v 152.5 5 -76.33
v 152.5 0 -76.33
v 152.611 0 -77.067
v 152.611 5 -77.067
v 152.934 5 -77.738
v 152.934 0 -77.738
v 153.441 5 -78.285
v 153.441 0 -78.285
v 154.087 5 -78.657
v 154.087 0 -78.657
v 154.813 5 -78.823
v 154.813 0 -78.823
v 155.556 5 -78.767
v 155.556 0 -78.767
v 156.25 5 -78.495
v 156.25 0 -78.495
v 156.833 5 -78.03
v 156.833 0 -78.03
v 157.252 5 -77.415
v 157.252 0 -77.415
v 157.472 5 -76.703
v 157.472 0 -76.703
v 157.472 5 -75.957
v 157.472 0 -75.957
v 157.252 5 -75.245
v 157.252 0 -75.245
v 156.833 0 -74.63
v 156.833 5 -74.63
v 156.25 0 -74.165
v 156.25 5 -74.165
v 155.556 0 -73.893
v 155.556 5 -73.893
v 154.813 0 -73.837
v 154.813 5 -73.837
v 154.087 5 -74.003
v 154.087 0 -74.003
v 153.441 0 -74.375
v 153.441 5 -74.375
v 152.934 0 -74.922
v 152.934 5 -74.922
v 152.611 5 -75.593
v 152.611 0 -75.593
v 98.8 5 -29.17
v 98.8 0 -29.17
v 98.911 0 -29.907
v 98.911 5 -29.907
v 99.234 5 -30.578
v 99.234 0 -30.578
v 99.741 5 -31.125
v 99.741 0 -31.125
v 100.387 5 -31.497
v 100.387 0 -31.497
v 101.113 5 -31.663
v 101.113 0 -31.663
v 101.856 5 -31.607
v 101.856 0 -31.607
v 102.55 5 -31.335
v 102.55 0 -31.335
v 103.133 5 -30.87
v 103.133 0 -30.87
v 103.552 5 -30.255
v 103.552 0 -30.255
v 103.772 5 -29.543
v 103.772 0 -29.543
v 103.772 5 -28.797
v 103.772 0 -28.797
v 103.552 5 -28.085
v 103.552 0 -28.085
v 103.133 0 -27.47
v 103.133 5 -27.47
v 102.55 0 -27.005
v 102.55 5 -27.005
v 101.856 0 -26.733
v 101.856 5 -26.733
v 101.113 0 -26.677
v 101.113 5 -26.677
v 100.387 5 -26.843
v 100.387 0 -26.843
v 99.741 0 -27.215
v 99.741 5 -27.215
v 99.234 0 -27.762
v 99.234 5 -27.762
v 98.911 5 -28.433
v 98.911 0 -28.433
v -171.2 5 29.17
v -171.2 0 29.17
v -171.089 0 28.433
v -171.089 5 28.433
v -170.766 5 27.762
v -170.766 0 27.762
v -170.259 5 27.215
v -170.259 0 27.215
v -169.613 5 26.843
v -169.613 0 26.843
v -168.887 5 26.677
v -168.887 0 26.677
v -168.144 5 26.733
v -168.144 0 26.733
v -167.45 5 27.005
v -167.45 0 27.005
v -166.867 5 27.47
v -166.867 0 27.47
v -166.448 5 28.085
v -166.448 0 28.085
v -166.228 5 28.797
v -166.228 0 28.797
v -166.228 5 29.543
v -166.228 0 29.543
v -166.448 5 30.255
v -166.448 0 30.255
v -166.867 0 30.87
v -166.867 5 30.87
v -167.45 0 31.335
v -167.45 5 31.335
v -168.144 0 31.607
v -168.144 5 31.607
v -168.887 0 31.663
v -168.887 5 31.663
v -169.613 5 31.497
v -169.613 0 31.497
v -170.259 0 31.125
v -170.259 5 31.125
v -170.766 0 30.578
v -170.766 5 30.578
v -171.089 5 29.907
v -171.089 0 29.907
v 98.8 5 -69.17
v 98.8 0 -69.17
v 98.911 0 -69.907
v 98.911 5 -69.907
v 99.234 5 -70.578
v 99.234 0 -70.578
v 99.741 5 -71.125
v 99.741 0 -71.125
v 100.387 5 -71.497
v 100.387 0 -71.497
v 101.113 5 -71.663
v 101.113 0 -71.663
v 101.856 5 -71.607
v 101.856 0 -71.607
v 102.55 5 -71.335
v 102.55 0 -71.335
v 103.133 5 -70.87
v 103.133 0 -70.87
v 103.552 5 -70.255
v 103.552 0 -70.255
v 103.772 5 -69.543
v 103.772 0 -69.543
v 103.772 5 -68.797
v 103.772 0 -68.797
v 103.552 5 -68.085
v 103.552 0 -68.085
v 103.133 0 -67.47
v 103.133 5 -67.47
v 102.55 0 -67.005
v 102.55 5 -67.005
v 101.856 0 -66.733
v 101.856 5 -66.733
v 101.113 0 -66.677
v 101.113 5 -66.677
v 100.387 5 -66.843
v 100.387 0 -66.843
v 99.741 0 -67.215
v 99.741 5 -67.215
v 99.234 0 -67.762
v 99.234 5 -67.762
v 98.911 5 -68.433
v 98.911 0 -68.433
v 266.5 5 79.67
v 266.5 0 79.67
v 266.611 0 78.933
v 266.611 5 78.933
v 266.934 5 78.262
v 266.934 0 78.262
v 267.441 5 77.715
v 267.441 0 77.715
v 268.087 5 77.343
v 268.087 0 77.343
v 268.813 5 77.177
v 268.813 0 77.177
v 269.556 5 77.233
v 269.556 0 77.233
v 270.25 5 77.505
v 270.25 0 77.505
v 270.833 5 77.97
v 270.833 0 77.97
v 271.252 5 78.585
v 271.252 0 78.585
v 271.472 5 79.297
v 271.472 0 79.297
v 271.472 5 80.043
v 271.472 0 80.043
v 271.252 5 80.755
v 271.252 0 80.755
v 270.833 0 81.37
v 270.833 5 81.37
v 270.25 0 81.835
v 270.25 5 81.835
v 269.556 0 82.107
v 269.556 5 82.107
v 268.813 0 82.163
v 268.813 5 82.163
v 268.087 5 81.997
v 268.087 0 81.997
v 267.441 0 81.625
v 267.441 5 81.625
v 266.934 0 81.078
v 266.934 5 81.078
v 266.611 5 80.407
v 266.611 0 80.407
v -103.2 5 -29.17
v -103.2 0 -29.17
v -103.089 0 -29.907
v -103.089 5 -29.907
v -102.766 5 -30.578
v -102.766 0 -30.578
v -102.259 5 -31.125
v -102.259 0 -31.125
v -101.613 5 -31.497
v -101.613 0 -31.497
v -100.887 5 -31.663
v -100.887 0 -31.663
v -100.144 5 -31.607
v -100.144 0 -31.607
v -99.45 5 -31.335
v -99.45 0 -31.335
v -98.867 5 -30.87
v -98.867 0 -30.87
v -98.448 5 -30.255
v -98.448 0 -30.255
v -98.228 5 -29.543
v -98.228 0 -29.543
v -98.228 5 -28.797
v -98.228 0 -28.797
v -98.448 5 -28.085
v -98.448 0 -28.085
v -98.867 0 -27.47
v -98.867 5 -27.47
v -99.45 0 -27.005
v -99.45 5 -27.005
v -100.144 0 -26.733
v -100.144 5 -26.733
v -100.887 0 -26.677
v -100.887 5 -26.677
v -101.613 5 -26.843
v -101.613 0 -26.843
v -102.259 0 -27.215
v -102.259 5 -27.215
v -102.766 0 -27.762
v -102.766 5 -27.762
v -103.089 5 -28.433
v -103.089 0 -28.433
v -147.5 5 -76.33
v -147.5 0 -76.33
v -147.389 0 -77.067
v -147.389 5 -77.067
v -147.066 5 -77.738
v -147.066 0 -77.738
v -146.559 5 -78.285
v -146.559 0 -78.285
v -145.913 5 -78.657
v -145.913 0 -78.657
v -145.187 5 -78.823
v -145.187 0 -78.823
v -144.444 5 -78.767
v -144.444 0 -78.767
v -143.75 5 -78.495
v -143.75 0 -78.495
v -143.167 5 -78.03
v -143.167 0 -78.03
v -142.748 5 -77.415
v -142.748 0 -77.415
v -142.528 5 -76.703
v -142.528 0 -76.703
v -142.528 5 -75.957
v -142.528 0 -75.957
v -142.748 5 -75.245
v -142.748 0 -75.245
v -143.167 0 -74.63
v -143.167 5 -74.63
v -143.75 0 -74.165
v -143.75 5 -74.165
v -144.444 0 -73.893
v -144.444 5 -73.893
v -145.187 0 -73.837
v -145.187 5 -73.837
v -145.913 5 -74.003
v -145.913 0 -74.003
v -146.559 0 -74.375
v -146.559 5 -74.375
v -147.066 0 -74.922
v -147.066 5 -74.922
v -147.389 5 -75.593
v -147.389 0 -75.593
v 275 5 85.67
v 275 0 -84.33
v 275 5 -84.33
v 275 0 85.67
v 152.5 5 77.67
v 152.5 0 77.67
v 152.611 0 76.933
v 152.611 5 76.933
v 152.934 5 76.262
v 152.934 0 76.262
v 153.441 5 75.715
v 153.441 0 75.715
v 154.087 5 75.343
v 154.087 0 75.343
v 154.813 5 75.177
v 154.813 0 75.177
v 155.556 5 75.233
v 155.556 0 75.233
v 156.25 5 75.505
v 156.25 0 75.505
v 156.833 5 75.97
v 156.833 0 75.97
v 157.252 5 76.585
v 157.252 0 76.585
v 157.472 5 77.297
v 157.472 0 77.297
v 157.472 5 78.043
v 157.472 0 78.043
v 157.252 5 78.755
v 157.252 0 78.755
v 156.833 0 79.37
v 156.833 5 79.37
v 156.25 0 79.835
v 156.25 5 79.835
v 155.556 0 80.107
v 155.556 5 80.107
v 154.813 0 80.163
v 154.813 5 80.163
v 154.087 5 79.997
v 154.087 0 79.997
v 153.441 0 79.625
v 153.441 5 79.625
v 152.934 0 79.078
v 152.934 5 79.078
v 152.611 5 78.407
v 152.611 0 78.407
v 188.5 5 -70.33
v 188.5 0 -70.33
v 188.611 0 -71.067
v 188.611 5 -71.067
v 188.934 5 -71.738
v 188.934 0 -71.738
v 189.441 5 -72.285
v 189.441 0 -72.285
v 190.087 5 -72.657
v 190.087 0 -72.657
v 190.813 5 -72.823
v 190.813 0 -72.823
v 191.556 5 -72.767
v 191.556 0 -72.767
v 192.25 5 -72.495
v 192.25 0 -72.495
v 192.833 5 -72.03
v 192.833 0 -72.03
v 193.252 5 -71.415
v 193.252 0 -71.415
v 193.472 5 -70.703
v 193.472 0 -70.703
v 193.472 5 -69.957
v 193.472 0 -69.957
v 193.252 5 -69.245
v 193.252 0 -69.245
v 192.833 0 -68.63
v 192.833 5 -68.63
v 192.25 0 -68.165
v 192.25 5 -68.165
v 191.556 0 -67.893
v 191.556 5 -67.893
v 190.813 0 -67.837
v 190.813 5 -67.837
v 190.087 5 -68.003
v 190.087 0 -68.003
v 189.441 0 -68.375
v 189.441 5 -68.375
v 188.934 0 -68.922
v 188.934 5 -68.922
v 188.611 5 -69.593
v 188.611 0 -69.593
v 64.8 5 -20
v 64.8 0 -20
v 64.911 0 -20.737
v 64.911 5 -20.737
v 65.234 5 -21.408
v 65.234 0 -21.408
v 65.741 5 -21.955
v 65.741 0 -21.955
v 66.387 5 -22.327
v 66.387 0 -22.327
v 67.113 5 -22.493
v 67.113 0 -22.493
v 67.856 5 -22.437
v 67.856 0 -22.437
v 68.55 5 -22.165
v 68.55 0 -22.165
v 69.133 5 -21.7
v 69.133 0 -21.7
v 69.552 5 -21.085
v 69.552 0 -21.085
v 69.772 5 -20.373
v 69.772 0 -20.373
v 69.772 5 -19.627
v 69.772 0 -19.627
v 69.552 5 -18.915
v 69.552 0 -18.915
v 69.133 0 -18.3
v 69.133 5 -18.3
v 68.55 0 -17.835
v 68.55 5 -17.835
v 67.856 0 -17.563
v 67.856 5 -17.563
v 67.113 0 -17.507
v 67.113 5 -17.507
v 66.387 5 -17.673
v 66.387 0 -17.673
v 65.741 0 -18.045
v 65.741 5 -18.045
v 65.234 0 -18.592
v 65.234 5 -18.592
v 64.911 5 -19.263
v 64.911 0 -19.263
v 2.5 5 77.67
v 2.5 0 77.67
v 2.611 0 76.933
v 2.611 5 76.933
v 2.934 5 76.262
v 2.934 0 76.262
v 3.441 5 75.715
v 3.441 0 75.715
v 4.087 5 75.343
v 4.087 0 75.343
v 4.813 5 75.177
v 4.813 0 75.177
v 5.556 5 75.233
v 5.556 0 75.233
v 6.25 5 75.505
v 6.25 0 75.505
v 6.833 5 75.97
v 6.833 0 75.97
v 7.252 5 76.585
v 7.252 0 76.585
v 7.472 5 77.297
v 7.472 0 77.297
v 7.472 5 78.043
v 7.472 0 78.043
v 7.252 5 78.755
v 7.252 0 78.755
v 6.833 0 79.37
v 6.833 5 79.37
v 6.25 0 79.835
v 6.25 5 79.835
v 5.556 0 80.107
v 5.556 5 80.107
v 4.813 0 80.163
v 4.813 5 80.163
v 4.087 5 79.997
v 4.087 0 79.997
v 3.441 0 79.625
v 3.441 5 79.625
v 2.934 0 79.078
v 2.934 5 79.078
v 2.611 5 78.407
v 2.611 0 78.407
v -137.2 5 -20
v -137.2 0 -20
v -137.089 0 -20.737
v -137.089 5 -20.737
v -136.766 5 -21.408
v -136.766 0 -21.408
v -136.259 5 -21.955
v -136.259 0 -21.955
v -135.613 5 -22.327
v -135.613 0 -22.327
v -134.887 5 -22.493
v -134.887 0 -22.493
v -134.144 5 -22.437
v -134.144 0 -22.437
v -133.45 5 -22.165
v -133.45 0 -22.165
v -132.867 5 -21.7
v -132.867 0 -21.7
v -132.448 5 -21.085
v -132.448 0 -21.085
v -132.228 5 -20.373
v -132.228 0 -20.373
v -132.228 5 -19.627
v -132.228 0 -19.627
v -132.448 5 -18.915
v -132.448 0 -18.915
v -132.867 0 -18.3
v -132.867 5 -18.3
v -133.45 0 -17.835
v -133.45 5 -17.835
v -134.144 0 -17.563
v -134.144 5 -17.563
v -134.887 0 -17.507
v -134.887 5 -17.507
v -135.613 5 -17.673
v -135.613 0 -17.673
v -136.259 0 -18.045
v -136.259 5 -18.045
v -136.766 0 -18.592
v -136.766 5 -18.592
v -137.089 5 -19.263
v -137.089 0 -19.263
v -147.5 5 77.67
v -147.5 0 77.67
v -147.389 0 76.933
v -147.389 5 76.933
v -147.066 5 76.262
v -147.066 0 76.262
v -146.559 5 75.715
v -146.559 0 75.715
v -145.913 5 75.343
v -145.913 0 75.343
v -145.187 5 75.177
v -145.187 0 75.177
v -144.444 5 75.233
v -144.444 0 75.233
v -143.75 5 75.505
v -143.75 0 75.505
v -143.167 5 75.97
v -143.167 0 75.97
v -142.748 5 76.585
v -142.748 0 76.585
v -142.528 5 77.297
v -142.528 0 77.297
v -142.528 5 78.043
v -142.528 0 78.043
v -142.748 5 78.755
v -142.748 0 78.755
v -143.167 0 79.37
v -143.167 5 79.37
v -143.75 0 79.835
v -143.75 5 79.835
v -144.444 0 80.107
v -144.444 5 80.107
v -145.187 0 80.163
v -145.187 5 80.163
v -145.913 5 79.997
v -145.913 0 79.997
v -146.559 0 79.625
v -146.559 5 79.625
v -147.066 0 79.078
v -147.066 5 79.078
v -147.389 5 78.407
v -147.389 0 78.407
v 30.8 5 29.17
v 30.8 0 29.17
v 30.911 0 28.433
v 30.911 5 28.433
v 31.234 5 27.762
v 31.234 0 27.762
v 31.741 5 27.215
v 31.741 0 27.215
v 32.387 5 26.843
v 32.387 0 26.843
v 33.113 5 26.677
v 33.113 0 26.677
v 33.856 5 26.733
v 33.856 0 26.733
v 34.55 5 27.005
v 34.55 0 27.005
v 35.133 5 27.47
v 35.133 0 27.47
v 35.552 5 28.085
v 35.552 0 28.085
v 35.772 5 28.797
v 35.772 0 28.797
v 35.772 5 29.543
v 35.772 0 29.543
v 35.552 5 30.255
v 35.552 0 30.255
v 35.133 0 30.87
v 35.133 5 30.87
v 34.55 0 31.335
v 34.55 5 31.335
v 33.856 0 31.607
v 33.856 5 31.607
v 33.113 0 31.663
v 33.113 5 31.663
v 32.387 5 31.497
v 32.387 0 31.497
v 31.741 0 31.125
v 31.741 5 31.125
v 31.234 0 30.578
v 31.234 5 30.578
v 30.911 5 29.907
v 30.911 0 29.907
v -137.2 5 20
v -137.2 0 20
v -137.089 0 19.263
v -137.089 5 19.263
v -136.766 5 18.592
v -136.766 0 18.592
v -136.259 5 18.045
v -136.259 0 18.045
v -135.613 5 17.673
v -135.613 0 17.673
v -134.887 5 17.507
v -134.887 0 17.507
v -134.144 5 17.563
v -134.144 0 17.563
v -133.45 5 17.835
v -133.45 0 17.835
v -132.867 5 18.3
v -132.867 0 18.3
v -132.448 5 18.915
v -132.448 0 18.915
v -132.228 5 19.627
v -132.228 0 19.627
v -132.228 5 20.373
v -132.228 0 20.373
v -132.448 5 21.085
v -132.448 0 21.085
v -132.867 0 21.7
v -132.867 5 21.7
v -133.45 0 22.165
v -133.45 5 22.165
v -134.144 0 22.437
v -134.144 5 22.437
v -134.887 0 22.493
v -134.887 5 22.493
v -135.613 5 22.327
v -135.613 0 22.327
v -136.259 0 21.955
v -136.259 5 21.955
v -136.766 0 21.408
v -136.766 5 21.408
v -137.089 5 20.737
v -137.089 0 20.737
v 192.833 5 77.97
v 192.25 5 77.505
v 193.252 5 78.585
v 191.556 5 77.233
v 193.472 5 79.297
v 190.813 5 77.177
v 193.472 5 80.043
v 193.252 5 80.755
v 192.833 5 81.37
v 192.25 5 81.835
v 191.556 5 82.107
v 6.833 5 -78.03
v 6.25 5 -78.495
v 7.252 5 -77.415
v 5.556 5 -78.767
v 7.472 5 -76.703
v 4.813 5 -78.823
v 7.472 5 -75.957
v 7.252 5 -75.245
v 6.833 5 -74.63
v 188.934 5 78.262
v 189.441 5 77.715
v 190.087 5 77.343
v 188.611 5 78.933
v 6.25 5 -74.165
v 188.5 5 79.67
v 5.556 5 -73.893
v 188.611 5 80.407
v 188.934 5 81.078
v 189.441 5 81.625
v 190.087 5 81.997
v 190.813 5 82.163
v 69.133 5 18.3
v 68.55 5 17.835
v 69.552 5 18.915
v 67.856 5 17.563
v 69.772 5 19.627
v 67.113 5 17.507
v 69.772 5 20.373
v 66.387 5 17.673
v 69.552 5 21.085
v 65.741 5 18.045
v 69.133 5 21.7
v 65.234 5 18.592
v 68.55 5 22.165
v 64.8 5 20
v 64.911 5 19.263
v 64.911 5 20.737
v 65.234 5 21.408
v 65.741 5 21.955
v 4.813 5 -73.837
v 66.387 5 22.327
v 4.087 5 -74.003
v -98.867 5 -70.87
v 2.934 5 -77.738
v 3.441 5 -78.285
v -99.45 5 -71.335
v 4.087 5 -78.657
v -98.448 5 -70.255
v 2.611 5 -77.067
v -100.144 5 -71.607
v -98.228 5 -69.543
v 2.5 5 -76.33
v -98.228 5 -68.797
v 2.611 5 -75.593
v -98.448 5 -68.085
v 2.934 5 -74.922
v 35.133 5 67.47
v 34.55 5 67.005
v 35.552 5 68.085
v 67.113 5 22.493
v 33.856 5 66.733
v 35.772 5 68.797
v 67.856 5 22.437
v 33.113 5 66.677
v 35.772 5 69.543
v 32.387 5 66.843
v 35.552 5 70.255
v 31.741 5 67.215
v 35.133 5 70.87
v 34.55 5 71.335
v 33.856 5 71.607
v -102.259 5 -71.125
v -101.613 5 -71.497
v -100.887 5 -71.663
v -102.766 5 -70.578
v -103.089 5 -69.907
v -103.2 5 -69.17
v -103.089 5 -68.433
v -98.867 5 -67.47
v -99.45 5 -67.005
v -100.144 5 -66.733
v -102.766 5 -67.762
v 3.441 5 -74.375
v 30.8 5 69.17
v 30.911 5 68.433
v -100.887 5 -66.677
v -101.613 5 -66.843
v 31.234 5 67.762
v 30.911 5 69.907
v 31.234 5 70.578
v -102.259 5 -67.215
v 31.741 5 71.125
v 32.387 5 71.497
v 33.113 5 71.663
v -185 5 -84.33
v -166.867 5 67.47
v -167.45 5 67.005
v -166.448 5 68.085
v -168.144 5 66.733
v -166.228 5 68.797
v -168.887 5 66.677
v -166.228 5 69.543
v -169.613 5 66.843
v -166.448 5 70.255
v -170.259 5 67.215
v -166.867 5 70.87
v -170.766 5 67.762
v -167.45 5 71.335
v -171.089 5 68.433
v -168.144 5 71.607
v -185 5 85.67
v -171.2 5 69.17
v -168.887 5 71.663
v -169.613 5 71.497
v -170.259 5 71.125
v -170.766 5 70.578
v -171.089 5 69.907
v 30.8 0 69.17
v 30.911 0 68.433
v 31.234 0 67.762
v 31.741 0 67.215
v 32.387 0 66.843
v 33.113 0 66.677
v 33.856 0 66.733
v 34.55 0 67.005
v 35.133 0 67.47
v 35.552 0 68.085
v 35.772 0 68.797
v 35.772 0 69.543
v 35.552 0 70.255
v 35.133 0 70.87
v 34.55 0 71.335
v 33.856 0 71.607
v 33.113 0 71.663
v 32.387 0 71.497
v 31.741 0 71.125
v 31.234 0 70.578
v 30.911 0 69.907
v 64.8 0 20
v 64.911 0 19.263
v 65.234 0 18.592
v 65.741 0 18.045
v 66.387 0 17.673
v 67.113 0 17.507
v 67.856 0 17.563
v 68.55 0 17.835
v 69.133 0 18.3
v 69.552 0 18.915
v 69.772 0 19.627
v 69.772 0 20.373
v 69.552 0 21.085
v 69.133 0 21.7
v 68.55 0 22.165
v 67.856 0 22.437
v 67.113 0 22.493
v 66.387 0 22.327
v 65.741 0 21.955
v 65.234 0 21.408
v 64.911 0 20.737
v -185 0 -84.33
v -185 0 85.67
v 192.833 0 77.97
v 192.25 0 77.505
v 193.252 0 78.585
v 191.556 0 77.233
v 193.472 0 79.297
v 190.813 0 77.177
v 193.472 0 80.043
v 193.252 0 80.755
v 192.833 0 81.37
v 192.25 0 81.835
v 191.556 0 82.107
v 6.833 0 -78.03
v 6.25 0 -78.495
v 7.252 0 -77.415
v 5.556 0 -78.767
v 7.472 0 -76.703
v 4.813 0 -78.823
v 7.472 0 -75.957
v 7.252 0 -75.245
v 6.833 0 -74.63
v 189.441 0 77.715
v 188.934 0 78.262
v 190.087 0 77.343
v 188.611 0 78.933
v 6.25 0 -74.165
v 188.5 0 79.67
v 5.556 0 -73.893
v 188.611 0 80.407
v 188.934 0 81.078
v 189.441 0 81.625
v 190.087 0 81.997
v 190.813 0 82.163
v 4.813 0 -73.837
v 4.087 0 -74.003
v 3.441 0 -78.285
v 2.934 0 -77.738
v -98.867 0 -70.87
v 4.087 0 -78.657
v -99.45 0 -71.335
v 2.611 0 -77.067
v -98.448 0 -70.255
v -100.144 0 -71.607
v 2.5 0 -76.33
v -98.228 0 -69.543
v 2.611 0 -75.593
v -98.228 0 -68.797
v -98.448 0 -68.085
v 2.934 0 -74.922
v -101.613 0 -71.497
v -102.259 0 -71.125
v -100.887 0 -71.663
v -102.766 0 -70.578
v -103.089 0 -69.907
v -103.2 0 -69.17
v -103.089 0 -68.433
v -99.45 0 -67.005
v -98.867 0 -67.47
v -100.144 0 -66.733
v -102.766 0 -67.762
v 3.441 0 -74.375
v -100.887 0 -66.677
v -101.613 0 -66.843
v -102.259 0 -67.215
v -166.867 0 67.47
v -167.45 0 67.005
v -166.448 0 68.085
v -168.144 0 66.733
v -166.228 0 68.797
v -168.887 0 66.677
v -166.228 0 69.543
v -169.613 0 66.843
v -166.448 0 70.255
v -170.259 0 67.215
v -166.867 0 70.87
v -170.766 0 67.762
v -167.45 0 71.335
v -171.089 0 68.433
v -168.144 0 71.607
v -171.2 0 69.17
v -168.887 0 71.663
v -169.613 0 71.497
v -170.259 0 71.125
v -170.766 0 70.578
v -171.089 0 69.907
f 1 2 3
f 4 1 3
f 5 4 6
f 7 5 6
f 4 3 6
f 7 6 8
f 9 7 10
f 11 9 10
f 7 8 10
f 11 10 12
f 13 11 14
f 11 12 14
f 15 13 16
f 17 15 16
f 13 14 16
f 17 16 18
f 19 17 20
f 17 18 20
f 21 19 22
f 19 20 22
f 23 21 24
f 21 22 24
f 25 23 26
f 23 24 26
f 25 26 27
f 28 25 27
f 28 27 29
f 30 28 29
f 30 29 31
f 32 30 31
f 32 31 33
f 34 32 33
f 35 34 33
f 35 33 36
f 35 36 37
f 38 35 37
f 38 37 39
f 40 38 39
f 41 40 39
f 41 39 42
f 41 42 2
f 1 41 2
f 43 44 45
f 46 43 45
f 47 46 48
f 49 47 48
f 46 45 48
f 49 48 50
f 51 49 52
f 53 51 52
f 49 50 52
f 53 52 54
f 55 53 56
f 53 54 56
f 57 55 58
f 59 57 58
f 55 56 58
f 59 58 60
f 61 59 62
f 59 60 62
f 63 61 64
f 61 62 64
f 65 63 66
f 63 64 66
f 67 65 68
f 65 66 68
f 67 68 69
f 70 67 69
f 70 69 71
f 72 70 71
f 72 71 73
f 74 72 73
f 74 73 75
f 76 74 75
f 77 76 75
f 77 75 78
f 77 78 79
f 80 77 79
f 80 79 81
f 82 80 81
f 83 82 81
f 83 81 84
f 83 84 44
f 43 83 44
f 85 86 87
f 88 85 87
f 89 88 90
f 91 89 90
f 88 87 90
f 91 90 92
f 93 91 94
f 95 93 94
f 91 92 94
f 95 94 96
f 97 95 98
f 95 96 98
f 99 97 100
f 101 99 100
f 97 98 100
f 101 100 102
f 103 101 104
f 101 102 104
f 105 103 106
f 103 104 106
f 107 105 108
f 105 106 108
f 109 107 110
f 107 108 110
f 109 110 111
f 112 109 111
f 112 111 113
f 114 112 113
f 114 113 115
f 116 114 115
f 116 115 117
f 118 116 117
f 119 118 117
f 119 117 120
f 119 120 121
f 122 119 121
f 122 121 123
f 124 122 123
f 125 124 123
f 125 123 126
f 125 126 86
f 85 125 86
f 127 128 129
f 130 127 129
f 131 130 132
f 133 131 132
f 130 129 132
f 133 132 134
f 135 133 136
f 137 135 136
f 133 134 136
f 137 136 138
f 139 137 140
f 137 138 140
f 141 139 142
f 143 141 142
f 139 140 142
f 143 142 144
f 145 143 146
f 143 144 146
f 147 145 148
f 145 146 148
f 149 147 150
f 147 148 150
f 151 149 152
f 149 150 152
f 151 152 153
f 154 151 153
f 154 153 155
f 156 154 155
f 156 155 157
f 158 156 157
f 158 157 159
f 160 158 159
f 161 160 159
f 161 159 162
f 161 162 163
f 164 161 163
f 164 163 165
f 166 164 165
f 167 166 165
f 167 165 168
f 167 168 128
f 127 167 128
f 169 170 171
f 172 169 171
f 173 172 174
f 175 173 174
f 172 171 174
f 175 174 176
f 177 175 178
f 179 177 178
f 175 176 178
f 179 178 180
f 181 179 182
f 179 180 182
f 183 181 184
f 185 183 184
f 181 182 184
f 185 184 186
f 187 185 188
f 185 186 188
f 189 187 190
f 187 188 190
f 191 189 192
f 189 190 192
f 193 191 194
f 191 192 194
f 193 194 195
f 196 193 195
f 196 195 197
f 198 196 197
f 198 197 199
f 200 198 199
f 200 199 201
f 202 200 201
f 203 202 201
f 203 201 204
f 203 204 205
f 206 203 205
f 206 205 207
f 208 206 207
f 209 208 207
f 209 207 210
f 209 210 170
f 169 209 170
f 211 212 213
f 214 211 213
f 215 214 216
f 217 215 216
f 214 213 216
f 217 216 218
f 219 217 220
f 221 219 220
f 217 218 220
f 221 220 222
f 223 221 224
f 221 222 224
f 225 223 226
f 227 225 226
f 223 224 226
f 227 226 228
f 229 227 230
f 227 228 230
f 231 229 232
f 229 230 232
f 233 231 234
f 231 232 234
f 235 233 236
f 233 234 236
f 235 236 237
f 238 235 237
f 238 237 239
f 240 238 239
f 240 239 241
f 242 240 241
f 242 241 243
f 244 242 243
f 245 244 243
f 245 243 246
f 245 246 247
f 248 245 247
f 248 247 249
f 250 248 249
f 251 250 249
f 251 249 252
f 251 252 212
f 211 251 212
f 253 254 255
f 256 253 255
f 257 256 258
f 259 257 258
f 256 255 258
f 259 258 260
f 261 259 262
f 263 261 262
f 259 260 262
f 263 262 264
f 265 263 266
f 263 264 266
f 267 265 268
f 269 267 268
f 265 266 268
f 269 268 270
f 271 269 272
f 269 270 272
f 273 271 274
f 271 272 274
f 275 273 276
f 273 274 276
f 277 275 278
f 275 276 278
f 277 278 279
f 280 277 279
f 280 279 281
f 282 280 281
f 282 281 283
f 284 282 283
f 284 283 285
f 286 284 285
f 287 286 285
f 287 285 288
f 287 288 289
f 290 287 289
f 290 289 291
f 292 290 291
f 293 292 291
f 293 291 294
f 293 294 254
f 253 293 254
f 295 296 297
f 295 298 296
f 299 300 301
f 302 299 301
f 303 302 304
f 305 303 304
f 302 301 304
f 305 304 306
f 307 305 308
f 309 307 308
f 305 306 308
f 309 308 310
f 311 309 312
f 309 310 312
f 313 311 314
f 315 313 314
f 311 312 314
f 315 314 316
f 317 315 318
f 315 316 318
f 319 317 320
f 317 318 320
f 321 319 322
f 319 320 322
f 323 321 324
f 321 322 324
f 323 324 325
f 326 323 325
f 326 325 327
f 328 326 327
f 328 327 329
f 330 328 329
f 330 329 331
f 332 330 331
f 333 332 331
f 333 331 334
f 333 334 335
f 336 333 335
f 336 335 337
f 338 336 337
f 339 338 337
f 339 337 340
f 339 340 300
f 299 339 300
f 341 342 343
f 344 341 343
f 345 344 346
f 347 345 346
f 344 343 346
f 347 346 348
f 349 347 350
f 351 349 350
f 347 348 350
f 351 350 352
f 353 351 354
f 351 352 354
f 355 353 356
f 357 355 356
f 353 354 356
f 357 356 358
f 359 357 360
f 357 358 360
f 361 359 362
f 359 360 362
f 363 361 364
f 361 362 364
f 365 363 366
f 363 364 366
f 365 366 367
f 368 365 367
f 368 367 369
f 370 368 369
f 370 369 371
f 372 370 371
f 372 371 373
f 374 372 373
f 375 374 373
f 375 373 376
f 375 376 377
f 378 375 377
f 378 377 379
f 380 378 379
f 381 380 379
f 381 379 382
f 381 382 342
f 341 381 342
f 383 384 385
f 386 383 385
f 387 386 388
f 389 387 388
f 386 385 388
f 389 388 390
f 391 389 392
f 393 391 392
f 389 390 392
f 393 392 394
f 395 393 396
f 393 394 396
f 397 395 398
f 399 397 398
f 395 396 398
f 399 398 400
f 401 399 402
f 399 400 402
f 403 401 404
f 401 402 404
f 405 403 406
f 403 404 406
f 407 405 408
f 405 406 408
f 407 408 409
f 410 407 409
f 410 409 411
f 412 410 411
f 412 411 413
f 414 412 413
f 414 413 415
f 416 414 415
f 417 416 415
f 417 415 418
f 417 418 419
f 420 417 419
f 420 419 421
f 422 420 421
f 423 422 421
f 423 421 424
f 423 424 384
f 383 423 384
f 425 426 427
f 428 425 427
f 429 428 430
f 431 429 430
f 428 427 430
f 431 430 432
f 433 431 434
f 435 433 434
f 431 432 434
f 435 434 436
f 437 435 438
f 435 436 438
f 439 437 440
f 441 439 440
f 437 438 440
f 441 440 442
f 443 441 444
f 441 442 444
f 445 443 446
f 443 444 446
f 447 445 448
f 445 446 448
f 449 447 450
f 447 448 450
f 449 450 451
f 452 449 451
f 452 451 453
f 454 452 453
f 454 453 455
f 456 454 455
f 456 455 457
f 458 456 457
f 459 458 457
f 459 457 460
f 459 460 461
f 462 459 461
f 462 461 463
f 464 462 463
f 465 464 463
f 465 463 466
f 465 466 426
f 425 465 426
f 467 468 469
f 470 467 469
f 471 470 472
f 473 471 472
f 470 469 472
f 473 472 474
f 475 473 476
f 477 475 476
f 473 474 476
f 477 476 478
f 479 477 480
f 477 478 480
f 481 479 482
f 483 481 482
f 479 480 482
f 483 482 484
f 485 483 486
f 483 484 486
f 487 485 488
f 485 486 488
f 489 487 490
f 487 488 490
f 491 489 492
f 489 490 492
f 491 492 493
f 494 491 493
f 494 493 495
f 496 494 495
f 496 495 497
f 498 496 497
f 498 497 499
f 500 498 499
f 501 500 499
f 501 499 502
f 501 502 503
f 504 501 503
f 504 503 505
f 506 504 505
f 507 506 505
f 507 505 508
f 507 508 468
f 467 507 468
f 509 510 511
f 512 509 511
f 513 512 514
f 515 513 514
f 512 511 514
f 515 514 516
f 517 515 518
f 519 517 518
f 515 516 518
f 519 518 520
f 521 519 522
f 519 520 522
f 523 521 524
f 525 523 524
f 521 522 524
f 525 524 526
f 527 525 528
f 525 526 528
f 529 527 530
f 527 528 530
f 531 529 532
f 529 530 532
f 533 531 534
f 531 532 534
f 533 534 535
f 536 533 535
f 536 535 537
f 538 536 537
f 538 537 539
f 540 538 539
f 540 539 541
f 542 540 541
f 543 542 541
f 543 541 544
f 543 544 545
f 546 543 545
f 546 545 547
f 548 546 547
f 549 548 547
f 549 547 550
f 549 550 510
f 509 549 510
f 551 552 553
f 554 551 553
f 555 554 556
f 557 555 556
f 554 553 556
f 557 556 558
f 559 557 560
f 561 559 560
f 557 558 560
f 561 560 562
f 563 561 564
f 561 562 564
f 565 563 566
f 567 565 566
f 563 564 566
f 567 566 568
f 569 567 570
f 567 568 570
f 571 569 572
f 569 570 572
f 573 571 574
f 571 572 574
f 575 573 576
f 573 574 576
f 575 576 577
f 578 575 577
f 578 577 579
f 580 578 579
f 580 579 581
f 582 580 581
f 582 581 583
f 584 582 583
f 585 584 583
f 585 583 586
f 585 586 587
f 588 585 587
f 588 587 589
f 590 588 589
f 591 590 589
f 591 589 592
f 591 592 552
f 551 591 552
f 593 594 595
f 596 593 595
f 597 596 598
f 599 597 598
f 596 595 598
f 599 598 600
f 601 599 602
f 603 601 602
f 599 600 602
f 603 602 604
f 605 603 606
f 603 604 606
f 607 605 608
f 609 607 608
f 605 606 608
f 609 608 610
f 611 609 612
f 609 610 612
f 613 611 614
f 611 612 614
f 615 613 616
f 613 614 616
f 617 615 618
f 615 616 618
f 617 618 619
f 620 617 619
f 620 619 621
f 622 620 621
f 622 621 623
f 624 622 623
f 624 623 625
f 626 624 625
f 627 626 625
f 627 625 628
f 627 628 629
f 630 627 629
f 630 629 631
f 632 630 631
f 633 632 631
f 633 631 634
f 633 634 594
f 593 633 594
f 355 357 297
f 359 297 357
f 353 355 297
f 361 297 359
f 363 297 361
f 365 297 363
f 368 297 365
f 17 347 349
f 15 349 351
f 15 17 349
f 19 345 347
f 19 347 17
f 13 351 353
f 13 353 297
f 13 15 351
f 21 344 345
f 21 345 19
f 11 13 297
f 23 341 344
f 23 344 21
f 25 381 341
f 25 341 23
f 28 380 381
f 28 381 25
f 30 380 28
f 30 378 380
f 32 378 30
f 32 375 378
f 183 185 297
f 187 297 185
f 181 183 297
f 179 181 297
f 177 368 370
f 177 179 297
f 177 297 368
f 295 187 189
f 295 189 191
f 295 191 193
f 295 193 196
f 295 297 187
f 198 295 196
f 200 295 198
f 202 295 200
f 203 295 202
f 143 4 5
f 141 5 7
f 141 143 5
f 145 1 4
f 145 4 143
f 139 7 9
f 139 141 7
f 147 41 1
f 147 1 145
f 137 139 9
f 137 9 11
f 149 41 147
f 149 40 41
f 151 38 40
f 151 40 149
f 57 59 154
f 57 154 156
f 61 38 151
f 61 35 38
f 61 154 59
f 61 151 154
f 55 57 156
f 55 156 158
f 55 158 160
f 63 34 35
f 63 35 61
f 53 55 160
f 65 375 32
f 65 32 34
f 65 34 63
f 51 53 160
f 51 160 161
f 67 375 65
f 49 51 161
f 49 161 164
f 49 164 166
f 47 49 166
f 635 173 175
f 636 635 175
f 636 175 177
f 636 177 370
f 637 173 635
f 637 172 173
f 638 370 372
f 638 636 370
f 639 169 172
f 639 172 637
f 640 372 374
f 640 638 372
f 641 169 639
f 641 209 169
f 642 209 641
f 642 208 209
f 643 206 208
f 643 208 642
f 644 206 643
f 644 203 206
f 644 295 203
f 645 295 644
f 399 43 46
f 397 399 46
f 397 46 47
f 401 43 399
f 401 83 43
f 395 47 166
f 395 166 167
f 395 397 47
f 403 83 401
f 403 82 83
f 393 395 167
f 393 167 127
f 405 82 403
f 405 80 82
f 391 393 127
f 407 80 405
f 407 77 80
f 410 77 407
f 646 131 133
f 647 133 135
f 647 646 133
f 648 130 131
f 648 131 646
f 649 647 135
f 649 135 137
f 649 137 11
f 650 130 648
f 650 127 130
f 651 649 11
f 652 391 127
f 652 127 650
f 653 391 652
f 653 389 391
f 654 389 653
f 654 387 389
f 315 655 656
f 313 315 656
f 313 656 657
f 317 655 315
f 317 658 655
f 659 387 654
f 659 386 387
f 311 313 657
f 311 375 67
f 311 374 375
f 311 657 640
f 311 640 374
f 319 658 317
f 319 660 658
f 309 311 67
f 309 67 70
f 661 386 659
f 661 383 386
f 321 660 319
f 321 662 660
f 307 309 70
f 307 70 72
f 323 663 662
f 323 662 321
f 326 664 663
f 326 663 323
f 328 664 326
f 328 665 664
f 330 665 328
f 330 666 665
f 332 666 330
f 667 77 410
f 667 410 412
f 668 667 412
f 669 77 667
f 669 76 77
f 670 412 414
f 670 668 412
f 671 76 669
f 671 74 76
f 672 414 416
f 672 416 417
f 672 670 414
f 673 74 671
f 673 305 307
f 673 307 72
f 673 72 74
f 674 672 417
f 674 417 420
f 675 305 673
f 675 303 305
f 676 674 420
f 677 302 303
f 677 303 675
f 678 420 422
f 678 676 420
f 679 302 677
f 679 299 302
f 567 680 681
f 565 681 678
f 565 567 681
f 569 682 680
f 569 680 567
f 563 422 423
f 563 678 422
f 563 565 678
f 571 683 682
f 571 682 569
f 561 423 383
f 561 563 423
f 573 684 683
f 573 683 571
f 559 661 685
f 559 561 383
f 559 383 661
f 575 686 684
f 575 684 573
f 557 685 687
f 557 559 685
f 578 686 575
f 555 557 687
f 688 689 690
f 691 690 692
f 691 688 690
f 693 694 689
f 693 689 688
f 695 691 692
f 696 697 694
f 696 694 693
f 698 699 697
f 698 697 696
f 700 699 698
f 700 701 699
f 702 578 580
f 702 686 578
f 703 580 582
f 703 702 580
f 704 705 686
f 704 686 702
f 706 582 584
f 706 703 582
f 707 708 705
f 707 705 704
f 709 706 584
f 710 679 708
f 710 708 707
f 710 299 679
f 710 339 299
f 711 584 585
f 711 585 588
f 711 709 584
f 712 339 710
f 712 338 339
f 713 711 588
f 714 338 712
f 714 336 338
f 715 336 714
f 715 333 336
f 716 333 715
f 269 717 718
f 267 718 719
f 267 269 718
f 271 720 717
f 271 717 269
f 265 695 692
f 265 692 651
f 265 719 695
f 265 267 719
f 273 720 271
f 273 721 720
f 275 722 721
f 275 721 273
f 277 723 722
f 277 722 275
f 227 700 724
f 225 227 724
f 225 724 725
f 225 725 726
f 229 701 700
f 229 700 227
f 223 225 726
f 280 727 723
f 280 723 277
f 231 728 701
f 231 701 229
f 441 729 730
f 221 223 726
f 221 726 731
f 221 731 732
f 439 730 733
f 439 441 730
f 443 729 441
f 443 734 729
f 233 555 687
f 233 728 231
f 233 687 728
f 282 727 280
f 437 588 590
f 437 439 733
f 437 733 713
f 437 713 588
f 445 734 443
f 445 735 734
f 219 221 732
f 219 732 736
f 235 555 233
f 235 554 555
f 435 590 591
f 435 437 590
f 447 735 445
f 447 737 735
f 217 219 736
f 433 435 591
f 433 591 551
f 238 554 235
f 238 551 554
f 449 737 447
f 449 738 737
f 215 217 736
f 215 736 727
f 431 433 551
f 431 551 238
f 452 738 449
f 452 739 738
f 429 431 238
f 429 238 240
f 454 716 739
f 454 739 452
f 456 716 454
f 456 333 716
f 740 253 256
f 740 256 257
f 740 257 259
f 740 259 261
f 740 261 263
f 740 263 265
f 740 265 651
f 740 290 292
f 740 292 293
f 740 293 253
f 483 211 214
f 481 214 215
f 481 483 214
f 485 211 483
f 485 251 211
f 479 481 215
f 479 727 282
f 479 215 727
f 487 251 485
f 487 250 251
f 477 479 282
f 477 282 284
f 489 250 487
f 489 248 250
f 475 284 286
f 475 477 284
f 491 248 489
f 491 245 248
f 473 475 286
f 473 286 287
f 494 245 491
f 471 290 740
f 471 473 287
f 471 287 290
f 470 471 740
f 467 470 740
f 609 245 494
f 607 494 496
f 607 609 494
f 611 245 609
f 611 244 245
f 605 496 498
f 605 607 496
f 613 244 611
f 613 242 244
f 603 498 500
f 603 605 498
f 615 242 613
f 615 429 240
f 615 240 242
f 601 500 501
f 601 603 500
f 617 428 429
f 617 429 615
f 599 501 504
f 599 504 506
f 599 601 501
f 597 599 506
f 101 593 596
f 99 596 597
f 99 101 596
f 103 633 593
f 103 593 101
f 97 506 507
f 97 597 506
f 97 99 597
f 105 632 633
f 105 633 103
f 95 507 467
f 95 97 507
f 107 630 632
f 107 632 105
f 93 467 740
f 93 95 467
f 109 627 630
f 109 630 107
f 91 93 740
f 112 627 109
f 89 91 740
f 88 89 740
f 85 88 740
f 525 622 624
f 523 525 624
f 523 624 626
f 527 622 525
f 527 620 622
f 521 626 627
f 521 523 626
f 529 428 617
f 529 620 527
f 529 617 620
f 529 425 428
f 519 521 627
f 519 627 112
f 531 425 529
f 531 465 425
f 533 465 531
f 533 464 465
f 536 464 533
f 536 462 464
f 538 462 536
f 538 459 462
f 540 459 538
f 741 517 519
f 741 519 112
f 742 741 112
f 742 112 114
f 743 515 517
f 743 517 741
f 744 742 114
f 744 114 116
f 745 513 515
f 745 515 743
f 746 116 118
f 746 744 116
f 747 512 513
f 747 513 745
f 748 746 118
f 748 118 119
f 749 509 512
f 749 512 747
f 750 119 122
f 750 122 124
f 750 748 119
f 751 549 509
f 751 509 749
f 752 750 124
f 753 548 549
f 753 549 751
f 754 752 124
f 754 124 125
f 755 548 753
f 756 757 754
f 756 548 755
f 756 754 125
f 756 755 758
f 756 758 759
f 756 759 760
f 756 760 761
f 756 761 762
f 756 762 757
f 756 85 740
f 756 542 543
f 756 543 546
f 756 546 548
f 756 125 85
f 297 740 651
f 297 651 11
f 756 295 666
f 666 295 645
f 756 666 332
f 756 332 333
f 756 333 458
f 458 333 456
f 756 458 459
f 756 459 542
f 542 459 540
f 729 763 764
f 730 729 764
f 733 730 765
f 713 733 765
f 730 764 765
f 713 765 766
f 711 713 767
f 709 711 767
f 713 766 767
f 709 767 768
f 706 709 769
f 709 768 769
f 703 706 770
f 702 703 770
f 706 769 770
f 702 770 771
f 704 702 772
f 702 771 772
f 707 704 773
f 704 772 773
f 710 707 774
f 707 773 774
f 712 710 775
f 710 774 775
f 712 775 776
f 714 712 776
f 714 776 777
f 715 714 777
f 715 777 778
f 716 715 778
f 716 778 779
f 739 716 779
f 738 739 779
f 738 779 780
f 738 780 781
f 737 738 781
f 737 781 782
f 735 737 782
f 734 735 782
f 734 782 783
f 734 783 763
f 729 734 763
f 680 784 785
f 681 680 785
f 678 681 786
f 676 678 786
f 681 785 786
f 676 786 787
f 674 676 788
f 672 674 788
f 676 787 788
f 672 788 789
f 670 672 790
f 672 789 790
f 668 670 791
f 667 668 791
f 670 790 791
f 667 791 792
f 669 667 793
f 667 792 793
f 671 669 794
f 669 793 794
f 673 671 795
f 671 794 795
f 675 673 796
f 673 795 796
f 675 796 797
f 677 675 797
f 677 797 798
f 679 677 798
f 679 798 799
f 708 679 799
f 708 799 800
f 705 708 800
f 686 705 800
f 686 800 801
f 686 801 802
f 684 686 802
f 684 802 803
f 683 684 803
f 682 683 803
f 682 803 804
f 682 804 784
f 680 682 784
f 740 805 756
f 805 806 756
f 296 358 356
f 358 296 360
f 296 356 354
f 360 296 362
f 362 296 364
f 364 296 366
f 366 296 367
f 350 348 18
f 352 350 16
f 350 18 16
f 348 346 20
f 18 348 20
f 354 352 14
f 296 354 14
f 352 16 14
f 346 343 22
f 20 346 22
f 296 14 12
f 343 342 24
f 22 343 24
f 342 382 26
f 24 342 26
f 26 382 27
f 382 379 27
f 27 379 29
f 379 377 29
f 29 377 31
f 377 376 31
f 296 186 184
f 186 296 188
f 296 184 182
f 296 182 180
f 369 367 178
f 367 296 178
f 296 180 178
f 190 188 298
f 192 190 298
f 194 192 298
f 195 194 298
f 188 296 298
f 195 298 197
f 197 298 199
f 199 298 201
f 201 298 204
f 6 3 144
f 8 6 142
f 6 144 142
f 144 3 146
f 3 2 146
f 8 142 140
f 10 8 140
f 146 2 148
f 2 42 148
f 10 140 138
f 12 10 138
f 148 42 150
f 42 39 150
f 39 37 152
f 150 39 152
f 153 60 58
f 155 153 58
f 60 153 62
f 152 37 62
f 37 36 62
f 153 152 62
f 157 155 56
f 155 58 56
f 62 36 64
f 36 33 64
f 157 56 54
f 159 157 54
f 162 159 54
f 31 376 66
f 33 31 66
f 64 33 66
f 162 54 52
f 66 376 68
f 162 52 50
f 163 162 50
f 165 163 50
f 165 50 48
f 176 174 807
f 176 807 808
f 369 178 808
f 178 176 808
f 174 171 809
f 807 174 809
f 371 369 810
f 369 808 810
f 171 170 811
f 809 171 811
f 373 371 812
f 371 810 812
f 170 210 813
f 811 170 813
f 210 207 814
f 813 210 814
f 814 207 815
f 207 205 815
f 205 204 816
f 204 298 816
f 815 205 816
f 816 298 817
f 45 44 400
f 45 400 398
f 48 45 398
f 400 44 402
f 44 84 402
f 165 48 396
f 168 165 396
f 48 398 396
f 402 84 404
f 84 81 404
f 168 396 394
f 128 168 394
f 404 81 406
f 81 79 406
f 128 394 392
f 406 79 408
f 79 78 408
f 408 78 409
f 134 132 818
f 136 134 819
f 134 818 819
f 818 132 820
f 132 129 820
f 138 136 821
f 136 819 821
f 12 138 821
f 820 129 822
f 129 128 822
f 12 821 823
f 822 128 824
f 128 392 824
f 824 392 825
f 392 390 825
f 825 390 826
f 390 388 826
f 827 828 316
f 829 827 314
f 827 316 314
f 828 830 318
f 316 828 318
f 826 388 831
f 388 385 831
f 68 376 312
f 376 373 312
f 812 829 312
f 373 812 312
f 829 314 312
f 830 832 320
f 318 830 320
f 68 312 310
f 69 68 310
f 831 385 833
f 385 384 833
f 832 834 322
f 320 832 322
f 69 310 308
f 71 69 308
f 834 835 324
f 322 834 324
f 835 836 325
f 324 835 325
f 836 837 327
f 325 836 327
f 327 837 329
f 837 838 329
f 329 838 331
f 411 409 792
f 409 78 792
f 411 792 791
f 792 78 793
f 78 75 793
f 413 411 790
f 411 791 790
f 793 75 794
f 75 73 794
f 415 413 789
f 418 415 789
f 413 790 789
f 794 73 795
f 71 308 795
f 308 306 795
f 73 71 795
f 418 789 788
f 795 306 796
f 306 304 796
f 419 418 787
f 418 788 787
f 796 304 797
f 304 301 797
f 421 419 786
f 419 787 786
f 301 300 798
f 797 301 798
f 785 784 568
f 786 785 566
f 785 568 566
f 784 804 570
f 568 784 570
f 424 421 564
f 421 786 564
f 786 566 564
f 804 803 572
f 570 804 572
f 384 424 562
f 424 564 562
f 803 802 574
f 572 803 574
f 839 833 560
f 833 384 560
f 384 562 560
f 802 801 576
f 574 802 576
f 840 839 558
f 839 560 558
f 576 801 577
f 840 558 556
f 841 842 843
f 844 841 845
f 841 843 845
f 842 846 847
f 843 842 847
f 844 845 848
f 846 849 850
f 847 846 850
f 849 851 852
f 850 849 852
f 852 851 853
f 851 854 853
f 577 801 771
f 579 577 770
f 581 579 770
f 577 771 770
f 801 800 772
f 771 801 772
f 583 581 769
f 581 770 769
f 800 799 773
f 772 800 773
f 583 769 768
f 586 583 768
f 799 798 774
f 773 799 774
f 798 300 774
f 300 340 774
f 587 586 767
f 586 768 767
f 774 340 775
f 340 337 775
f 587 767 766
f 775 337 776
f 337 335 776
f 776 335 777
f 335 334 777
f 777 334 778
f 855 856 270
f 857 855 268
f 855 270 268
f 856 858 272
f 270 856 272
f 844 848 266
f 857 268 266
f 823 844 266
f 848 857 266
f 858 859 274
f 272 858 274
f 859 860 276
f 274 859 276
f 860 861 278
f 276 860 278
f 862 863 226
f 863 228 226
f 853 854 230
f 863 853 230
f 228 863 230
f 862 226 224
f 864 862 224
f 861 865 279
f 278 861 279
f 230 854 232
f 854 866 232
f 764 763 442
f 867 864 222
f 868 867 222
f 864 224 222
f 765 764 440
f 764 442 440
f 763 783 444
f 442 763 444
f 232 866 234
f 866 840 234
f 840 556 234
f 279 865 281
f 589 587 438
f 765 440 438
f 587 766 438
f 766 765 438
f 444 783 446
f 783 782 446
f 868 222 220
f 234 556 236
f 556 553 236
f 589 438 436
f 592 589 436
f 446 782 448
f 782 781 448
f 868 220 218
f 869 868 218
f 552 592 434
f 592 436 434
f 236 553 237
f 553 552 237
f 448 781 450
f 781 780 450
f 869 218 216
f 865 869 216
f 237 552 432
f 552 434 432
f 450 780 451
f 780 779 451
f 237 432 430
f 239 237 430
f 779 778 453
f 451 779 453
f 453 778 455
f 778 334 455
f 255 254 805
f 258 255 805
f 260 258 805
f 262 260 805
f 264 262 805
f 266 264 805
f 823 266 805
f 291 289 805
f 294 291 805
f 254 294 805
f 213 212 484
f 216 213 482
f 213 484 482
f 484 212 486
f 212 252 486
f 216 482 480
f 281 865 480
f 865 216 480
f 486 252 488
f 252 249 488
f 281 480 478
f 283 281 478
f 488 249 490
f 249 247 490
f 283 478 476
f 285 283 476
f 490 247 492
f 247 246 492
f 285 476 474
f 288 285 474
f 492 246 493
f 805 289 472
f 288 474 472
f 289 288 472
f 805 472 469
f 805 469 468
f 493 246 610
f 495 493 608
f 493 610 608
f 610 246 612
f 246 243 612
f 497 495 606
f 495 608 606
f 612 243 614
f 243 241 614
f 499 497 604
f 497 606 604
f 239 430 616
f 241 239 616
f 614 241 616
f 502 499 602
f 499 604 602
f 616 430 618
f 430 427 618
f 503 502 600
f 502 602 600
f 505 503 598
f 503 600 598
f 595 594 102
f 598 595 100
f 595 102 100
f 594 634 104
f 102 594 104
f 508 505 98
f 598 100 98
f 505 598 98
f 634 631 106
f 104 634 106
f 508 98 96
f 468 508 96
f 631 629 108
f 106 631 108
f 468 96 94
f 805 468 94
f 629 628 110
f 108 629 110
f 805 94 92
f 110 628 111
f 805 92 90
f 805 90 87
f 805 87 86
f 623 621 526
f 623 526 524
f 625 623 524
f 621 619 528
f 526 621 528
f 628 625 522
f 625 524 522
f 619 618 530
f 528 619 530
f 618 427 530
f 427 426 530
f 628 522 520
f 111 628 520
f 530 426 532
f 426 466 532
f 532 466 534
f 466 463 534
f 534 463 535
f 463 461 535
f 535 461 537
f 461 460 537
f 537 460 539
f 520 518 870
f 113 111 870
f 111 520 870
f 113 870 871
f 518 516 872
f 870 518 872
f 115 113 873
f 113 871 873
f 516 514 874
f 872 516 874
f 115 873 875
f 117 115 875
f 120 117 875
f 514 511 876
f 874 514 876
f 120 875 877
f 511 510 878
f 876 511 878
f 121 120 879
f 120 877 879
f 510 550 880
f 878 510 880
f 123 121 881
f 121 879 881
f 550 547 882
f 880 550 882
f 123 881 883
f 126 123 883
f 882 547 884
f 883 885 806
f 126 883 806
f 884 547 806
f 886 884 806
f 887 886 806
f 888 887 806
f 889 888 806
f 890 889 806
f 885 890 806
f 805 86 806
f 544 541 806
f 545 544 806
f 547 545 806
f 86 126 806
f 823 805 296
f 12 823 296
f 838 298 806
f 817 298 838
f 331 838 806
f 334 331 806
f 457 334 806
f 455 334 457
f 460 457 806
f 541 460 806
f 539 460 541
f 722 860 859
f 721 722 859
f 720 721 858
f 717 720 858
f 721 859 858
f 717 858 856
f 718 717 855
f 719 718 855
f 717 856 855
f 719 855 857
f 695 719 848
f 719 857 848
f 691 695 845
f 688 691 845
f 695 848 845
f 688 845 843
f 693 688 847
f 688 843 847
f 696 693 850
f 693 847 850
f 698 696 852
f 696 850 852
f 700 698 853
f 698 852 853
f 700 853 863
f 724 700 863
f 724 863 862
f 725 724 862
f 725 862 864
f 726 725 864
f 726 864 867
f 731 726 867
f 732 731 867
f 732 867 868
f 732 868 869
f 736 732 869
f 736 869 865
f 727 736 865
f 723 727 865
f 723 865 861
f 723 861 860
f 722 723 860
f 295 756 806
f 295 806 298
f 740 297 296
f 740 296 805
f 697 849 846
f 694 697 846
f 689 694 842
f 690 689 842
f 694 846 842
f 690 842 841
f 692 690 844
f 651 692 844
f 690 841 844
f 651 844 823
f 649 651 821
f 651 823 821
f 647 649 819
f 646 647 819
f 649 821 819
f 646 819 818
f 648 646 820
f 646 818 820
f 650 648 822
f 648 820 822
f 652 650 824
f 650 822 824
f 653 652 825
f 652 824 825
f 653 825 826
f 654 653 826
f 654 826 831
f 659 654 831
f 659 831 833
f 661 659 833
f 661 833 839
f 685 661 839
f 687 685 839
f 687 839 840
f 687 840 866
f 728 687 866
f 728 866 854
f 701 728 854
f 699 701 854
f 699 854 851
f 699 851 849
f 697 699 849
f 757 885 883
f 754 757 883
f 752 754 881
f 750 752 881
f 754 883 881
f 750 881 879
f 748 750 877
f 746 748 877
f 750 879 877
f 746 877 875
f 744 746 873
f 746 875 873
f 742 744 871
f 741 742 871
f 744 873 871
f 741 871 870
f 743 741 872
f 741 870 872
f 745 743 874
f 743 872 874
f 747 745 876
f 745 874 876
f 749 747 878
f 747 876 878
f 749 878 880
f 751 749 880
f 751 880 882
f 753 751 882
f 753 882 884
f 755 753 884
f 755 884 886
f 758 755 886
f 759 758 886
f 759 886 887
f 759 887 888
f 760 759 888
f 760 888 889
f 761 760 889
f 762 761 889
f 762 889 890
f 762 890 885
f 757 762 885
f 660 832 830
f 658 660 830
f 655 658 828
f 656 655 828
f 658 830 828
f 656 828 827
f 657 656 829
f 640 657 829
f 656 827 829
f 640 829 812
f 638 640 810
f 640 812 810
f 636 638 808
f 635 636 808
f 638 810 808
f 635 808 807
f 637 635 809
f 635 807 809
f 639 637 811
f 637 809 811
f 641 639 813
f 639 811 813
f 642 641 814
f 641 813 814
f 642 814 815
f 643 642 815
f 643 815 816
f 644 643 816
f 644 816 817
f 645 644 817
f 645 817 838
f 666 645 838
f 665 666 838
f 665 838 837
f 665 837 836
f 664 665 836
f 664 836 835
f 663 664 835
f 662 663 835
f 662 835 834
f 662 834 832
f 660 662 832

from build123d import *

# Parameters (mm, degrees)
SKIZZE1_W                       = 370
SKIZZE1_H                       = 165
AUFSATZ_LINEAR_AUSTRAGEN1_DEPTH = 5
M6_GEWINDEBOHRUNG1_D            = 5
M6_GEWINDEBOHRUNG1_DEPTH        = 5
SKIZZE5_W                       = 165
SKIZZE5_H                       = 5
AUFSATZ_LINEAR_AUSTRAGEN2_DEPTH = 90
SKIZZE9_W                       = 460
SKIZZE9_H                       = 5
AUFSATZ_LINEAR_AUSTRAGEN3_DEPTH = 3.17
M6_GEWINDEBOHRUNG2_D            = 5
M6_GEWINDEBOHRUNG2_DEPTH        = 5
SKIZZE12_W                      = 460
SKIZZE12_H                      = 5
AUFSATZ_LINEAR_AUSTRAGEN4_DEPTH = 1.83
M6_GEWINDEBOHRUNG3_D            = 5
M6_GEWINDEBOHRUNG3_DEPTH        = 5


with BuildPart() as part:
    # Skizze1 → Aufsatz-Linear austragen1 (new body)
    with BuildSketch(Plane(origin=(0, 0, 0), x_dir=(1, 0, 0), z_dir=(0, 1, 0))):
        Rectangle(SKIZZE1_W, SKIZZE1_H)
    extrude(amount=AUFSATZ_LINEAR_AUSTRAGEN1_DEPTH)

    # M6 Gewindebohrung1
    with Locations(Plane(origin=(0, 5, 0), x_dir=(1, 0, 0), z_dir=(0, 1, 0))):
        with Locations((67.3, -20), (67.3, 20), (-134.7, -20), (-134.7, 20), (101.3, 69.17), (-100.7, 29.17), (101.3, 29.17), (-100.7, 69.17), (33.3, -69.17), (-168.7, -29.17), (33.3, -29.17), (-168.7, -69.17)):
            Hole(M6_GEWINDEBOHRUNG1_D / 2, depth=M6_GEWINDEBOHRUNG1_DEPTH)

    # Skizze5 → Aufsatz-Linear austragen2 (add)
    with BuildSketch(Plane(origin=(185, 0, 0), x_dir=(0, 0, -1), z_dir=(1, 0, 0))):
        with Locations((0, 2.5)):
            Rectangle(SKIZZE5_W, SKIZZE5_H)
    extrude(amount=AUFSATZ_LINEAR_AUSTRAGEN2_DEPTH)

    # Skizze9 → Aufsatz-Linear austragen3 (add)
    with BuildSketch(Plane.XY.offset(82.5)):
        with Locations((45, 2.5)):
            Rectangle(SKIZZE9_W, SKIZZE9_H)
    extrude(amount=AUFSATZ_LINEAR_AUSTRAGEN3_DEPTH)

    # M6 Gewindebohrung2
    with Locations(Plane(origin=(0, 5, 0), x_dir=(1, 0, 0), z_dir=(0, 1, 0))):
        with Locations((191, 70.33), (191, -79.67), (269, -79.67)):
            Hole(M6_GEWINDEBOHRUNG2_D / 2, depth=M6_GEWINDEBOHRUNG2_DEPTH)

    # Skizze12 → Aufsatz-Linear austragen4 (add)
    with BuildSketch(Plane(origin=(0, 0, -82.5), x_dir=(-1, 0, 0), z_dir=(0, 0, -1))):
        with Locations((-45, 2.5)):
            Rectangle(SKIZZE12_W, SKIZZE12_H)
    extrude(amount=AUFSATZ_LINEAR_AUSTRAGEN4_DEPTH)

    # M6 Gewindebohrung3
    with Locations(Plane(origin=(0, 5, 0), x_dir=(1, 0, 0), z_dir=(0, 1, 0))):
        with Locations((-145, -77.67), (-145, 76.33), (5, -77.67), (5, 76.33), (155, -77.67), (155, 76.33)):
            Hole(M6_GEWINDEBOHRUNG3_D / 2, depth=M6_GEWINDEBOHRUNG3_DEPTH)


solid = part.part
